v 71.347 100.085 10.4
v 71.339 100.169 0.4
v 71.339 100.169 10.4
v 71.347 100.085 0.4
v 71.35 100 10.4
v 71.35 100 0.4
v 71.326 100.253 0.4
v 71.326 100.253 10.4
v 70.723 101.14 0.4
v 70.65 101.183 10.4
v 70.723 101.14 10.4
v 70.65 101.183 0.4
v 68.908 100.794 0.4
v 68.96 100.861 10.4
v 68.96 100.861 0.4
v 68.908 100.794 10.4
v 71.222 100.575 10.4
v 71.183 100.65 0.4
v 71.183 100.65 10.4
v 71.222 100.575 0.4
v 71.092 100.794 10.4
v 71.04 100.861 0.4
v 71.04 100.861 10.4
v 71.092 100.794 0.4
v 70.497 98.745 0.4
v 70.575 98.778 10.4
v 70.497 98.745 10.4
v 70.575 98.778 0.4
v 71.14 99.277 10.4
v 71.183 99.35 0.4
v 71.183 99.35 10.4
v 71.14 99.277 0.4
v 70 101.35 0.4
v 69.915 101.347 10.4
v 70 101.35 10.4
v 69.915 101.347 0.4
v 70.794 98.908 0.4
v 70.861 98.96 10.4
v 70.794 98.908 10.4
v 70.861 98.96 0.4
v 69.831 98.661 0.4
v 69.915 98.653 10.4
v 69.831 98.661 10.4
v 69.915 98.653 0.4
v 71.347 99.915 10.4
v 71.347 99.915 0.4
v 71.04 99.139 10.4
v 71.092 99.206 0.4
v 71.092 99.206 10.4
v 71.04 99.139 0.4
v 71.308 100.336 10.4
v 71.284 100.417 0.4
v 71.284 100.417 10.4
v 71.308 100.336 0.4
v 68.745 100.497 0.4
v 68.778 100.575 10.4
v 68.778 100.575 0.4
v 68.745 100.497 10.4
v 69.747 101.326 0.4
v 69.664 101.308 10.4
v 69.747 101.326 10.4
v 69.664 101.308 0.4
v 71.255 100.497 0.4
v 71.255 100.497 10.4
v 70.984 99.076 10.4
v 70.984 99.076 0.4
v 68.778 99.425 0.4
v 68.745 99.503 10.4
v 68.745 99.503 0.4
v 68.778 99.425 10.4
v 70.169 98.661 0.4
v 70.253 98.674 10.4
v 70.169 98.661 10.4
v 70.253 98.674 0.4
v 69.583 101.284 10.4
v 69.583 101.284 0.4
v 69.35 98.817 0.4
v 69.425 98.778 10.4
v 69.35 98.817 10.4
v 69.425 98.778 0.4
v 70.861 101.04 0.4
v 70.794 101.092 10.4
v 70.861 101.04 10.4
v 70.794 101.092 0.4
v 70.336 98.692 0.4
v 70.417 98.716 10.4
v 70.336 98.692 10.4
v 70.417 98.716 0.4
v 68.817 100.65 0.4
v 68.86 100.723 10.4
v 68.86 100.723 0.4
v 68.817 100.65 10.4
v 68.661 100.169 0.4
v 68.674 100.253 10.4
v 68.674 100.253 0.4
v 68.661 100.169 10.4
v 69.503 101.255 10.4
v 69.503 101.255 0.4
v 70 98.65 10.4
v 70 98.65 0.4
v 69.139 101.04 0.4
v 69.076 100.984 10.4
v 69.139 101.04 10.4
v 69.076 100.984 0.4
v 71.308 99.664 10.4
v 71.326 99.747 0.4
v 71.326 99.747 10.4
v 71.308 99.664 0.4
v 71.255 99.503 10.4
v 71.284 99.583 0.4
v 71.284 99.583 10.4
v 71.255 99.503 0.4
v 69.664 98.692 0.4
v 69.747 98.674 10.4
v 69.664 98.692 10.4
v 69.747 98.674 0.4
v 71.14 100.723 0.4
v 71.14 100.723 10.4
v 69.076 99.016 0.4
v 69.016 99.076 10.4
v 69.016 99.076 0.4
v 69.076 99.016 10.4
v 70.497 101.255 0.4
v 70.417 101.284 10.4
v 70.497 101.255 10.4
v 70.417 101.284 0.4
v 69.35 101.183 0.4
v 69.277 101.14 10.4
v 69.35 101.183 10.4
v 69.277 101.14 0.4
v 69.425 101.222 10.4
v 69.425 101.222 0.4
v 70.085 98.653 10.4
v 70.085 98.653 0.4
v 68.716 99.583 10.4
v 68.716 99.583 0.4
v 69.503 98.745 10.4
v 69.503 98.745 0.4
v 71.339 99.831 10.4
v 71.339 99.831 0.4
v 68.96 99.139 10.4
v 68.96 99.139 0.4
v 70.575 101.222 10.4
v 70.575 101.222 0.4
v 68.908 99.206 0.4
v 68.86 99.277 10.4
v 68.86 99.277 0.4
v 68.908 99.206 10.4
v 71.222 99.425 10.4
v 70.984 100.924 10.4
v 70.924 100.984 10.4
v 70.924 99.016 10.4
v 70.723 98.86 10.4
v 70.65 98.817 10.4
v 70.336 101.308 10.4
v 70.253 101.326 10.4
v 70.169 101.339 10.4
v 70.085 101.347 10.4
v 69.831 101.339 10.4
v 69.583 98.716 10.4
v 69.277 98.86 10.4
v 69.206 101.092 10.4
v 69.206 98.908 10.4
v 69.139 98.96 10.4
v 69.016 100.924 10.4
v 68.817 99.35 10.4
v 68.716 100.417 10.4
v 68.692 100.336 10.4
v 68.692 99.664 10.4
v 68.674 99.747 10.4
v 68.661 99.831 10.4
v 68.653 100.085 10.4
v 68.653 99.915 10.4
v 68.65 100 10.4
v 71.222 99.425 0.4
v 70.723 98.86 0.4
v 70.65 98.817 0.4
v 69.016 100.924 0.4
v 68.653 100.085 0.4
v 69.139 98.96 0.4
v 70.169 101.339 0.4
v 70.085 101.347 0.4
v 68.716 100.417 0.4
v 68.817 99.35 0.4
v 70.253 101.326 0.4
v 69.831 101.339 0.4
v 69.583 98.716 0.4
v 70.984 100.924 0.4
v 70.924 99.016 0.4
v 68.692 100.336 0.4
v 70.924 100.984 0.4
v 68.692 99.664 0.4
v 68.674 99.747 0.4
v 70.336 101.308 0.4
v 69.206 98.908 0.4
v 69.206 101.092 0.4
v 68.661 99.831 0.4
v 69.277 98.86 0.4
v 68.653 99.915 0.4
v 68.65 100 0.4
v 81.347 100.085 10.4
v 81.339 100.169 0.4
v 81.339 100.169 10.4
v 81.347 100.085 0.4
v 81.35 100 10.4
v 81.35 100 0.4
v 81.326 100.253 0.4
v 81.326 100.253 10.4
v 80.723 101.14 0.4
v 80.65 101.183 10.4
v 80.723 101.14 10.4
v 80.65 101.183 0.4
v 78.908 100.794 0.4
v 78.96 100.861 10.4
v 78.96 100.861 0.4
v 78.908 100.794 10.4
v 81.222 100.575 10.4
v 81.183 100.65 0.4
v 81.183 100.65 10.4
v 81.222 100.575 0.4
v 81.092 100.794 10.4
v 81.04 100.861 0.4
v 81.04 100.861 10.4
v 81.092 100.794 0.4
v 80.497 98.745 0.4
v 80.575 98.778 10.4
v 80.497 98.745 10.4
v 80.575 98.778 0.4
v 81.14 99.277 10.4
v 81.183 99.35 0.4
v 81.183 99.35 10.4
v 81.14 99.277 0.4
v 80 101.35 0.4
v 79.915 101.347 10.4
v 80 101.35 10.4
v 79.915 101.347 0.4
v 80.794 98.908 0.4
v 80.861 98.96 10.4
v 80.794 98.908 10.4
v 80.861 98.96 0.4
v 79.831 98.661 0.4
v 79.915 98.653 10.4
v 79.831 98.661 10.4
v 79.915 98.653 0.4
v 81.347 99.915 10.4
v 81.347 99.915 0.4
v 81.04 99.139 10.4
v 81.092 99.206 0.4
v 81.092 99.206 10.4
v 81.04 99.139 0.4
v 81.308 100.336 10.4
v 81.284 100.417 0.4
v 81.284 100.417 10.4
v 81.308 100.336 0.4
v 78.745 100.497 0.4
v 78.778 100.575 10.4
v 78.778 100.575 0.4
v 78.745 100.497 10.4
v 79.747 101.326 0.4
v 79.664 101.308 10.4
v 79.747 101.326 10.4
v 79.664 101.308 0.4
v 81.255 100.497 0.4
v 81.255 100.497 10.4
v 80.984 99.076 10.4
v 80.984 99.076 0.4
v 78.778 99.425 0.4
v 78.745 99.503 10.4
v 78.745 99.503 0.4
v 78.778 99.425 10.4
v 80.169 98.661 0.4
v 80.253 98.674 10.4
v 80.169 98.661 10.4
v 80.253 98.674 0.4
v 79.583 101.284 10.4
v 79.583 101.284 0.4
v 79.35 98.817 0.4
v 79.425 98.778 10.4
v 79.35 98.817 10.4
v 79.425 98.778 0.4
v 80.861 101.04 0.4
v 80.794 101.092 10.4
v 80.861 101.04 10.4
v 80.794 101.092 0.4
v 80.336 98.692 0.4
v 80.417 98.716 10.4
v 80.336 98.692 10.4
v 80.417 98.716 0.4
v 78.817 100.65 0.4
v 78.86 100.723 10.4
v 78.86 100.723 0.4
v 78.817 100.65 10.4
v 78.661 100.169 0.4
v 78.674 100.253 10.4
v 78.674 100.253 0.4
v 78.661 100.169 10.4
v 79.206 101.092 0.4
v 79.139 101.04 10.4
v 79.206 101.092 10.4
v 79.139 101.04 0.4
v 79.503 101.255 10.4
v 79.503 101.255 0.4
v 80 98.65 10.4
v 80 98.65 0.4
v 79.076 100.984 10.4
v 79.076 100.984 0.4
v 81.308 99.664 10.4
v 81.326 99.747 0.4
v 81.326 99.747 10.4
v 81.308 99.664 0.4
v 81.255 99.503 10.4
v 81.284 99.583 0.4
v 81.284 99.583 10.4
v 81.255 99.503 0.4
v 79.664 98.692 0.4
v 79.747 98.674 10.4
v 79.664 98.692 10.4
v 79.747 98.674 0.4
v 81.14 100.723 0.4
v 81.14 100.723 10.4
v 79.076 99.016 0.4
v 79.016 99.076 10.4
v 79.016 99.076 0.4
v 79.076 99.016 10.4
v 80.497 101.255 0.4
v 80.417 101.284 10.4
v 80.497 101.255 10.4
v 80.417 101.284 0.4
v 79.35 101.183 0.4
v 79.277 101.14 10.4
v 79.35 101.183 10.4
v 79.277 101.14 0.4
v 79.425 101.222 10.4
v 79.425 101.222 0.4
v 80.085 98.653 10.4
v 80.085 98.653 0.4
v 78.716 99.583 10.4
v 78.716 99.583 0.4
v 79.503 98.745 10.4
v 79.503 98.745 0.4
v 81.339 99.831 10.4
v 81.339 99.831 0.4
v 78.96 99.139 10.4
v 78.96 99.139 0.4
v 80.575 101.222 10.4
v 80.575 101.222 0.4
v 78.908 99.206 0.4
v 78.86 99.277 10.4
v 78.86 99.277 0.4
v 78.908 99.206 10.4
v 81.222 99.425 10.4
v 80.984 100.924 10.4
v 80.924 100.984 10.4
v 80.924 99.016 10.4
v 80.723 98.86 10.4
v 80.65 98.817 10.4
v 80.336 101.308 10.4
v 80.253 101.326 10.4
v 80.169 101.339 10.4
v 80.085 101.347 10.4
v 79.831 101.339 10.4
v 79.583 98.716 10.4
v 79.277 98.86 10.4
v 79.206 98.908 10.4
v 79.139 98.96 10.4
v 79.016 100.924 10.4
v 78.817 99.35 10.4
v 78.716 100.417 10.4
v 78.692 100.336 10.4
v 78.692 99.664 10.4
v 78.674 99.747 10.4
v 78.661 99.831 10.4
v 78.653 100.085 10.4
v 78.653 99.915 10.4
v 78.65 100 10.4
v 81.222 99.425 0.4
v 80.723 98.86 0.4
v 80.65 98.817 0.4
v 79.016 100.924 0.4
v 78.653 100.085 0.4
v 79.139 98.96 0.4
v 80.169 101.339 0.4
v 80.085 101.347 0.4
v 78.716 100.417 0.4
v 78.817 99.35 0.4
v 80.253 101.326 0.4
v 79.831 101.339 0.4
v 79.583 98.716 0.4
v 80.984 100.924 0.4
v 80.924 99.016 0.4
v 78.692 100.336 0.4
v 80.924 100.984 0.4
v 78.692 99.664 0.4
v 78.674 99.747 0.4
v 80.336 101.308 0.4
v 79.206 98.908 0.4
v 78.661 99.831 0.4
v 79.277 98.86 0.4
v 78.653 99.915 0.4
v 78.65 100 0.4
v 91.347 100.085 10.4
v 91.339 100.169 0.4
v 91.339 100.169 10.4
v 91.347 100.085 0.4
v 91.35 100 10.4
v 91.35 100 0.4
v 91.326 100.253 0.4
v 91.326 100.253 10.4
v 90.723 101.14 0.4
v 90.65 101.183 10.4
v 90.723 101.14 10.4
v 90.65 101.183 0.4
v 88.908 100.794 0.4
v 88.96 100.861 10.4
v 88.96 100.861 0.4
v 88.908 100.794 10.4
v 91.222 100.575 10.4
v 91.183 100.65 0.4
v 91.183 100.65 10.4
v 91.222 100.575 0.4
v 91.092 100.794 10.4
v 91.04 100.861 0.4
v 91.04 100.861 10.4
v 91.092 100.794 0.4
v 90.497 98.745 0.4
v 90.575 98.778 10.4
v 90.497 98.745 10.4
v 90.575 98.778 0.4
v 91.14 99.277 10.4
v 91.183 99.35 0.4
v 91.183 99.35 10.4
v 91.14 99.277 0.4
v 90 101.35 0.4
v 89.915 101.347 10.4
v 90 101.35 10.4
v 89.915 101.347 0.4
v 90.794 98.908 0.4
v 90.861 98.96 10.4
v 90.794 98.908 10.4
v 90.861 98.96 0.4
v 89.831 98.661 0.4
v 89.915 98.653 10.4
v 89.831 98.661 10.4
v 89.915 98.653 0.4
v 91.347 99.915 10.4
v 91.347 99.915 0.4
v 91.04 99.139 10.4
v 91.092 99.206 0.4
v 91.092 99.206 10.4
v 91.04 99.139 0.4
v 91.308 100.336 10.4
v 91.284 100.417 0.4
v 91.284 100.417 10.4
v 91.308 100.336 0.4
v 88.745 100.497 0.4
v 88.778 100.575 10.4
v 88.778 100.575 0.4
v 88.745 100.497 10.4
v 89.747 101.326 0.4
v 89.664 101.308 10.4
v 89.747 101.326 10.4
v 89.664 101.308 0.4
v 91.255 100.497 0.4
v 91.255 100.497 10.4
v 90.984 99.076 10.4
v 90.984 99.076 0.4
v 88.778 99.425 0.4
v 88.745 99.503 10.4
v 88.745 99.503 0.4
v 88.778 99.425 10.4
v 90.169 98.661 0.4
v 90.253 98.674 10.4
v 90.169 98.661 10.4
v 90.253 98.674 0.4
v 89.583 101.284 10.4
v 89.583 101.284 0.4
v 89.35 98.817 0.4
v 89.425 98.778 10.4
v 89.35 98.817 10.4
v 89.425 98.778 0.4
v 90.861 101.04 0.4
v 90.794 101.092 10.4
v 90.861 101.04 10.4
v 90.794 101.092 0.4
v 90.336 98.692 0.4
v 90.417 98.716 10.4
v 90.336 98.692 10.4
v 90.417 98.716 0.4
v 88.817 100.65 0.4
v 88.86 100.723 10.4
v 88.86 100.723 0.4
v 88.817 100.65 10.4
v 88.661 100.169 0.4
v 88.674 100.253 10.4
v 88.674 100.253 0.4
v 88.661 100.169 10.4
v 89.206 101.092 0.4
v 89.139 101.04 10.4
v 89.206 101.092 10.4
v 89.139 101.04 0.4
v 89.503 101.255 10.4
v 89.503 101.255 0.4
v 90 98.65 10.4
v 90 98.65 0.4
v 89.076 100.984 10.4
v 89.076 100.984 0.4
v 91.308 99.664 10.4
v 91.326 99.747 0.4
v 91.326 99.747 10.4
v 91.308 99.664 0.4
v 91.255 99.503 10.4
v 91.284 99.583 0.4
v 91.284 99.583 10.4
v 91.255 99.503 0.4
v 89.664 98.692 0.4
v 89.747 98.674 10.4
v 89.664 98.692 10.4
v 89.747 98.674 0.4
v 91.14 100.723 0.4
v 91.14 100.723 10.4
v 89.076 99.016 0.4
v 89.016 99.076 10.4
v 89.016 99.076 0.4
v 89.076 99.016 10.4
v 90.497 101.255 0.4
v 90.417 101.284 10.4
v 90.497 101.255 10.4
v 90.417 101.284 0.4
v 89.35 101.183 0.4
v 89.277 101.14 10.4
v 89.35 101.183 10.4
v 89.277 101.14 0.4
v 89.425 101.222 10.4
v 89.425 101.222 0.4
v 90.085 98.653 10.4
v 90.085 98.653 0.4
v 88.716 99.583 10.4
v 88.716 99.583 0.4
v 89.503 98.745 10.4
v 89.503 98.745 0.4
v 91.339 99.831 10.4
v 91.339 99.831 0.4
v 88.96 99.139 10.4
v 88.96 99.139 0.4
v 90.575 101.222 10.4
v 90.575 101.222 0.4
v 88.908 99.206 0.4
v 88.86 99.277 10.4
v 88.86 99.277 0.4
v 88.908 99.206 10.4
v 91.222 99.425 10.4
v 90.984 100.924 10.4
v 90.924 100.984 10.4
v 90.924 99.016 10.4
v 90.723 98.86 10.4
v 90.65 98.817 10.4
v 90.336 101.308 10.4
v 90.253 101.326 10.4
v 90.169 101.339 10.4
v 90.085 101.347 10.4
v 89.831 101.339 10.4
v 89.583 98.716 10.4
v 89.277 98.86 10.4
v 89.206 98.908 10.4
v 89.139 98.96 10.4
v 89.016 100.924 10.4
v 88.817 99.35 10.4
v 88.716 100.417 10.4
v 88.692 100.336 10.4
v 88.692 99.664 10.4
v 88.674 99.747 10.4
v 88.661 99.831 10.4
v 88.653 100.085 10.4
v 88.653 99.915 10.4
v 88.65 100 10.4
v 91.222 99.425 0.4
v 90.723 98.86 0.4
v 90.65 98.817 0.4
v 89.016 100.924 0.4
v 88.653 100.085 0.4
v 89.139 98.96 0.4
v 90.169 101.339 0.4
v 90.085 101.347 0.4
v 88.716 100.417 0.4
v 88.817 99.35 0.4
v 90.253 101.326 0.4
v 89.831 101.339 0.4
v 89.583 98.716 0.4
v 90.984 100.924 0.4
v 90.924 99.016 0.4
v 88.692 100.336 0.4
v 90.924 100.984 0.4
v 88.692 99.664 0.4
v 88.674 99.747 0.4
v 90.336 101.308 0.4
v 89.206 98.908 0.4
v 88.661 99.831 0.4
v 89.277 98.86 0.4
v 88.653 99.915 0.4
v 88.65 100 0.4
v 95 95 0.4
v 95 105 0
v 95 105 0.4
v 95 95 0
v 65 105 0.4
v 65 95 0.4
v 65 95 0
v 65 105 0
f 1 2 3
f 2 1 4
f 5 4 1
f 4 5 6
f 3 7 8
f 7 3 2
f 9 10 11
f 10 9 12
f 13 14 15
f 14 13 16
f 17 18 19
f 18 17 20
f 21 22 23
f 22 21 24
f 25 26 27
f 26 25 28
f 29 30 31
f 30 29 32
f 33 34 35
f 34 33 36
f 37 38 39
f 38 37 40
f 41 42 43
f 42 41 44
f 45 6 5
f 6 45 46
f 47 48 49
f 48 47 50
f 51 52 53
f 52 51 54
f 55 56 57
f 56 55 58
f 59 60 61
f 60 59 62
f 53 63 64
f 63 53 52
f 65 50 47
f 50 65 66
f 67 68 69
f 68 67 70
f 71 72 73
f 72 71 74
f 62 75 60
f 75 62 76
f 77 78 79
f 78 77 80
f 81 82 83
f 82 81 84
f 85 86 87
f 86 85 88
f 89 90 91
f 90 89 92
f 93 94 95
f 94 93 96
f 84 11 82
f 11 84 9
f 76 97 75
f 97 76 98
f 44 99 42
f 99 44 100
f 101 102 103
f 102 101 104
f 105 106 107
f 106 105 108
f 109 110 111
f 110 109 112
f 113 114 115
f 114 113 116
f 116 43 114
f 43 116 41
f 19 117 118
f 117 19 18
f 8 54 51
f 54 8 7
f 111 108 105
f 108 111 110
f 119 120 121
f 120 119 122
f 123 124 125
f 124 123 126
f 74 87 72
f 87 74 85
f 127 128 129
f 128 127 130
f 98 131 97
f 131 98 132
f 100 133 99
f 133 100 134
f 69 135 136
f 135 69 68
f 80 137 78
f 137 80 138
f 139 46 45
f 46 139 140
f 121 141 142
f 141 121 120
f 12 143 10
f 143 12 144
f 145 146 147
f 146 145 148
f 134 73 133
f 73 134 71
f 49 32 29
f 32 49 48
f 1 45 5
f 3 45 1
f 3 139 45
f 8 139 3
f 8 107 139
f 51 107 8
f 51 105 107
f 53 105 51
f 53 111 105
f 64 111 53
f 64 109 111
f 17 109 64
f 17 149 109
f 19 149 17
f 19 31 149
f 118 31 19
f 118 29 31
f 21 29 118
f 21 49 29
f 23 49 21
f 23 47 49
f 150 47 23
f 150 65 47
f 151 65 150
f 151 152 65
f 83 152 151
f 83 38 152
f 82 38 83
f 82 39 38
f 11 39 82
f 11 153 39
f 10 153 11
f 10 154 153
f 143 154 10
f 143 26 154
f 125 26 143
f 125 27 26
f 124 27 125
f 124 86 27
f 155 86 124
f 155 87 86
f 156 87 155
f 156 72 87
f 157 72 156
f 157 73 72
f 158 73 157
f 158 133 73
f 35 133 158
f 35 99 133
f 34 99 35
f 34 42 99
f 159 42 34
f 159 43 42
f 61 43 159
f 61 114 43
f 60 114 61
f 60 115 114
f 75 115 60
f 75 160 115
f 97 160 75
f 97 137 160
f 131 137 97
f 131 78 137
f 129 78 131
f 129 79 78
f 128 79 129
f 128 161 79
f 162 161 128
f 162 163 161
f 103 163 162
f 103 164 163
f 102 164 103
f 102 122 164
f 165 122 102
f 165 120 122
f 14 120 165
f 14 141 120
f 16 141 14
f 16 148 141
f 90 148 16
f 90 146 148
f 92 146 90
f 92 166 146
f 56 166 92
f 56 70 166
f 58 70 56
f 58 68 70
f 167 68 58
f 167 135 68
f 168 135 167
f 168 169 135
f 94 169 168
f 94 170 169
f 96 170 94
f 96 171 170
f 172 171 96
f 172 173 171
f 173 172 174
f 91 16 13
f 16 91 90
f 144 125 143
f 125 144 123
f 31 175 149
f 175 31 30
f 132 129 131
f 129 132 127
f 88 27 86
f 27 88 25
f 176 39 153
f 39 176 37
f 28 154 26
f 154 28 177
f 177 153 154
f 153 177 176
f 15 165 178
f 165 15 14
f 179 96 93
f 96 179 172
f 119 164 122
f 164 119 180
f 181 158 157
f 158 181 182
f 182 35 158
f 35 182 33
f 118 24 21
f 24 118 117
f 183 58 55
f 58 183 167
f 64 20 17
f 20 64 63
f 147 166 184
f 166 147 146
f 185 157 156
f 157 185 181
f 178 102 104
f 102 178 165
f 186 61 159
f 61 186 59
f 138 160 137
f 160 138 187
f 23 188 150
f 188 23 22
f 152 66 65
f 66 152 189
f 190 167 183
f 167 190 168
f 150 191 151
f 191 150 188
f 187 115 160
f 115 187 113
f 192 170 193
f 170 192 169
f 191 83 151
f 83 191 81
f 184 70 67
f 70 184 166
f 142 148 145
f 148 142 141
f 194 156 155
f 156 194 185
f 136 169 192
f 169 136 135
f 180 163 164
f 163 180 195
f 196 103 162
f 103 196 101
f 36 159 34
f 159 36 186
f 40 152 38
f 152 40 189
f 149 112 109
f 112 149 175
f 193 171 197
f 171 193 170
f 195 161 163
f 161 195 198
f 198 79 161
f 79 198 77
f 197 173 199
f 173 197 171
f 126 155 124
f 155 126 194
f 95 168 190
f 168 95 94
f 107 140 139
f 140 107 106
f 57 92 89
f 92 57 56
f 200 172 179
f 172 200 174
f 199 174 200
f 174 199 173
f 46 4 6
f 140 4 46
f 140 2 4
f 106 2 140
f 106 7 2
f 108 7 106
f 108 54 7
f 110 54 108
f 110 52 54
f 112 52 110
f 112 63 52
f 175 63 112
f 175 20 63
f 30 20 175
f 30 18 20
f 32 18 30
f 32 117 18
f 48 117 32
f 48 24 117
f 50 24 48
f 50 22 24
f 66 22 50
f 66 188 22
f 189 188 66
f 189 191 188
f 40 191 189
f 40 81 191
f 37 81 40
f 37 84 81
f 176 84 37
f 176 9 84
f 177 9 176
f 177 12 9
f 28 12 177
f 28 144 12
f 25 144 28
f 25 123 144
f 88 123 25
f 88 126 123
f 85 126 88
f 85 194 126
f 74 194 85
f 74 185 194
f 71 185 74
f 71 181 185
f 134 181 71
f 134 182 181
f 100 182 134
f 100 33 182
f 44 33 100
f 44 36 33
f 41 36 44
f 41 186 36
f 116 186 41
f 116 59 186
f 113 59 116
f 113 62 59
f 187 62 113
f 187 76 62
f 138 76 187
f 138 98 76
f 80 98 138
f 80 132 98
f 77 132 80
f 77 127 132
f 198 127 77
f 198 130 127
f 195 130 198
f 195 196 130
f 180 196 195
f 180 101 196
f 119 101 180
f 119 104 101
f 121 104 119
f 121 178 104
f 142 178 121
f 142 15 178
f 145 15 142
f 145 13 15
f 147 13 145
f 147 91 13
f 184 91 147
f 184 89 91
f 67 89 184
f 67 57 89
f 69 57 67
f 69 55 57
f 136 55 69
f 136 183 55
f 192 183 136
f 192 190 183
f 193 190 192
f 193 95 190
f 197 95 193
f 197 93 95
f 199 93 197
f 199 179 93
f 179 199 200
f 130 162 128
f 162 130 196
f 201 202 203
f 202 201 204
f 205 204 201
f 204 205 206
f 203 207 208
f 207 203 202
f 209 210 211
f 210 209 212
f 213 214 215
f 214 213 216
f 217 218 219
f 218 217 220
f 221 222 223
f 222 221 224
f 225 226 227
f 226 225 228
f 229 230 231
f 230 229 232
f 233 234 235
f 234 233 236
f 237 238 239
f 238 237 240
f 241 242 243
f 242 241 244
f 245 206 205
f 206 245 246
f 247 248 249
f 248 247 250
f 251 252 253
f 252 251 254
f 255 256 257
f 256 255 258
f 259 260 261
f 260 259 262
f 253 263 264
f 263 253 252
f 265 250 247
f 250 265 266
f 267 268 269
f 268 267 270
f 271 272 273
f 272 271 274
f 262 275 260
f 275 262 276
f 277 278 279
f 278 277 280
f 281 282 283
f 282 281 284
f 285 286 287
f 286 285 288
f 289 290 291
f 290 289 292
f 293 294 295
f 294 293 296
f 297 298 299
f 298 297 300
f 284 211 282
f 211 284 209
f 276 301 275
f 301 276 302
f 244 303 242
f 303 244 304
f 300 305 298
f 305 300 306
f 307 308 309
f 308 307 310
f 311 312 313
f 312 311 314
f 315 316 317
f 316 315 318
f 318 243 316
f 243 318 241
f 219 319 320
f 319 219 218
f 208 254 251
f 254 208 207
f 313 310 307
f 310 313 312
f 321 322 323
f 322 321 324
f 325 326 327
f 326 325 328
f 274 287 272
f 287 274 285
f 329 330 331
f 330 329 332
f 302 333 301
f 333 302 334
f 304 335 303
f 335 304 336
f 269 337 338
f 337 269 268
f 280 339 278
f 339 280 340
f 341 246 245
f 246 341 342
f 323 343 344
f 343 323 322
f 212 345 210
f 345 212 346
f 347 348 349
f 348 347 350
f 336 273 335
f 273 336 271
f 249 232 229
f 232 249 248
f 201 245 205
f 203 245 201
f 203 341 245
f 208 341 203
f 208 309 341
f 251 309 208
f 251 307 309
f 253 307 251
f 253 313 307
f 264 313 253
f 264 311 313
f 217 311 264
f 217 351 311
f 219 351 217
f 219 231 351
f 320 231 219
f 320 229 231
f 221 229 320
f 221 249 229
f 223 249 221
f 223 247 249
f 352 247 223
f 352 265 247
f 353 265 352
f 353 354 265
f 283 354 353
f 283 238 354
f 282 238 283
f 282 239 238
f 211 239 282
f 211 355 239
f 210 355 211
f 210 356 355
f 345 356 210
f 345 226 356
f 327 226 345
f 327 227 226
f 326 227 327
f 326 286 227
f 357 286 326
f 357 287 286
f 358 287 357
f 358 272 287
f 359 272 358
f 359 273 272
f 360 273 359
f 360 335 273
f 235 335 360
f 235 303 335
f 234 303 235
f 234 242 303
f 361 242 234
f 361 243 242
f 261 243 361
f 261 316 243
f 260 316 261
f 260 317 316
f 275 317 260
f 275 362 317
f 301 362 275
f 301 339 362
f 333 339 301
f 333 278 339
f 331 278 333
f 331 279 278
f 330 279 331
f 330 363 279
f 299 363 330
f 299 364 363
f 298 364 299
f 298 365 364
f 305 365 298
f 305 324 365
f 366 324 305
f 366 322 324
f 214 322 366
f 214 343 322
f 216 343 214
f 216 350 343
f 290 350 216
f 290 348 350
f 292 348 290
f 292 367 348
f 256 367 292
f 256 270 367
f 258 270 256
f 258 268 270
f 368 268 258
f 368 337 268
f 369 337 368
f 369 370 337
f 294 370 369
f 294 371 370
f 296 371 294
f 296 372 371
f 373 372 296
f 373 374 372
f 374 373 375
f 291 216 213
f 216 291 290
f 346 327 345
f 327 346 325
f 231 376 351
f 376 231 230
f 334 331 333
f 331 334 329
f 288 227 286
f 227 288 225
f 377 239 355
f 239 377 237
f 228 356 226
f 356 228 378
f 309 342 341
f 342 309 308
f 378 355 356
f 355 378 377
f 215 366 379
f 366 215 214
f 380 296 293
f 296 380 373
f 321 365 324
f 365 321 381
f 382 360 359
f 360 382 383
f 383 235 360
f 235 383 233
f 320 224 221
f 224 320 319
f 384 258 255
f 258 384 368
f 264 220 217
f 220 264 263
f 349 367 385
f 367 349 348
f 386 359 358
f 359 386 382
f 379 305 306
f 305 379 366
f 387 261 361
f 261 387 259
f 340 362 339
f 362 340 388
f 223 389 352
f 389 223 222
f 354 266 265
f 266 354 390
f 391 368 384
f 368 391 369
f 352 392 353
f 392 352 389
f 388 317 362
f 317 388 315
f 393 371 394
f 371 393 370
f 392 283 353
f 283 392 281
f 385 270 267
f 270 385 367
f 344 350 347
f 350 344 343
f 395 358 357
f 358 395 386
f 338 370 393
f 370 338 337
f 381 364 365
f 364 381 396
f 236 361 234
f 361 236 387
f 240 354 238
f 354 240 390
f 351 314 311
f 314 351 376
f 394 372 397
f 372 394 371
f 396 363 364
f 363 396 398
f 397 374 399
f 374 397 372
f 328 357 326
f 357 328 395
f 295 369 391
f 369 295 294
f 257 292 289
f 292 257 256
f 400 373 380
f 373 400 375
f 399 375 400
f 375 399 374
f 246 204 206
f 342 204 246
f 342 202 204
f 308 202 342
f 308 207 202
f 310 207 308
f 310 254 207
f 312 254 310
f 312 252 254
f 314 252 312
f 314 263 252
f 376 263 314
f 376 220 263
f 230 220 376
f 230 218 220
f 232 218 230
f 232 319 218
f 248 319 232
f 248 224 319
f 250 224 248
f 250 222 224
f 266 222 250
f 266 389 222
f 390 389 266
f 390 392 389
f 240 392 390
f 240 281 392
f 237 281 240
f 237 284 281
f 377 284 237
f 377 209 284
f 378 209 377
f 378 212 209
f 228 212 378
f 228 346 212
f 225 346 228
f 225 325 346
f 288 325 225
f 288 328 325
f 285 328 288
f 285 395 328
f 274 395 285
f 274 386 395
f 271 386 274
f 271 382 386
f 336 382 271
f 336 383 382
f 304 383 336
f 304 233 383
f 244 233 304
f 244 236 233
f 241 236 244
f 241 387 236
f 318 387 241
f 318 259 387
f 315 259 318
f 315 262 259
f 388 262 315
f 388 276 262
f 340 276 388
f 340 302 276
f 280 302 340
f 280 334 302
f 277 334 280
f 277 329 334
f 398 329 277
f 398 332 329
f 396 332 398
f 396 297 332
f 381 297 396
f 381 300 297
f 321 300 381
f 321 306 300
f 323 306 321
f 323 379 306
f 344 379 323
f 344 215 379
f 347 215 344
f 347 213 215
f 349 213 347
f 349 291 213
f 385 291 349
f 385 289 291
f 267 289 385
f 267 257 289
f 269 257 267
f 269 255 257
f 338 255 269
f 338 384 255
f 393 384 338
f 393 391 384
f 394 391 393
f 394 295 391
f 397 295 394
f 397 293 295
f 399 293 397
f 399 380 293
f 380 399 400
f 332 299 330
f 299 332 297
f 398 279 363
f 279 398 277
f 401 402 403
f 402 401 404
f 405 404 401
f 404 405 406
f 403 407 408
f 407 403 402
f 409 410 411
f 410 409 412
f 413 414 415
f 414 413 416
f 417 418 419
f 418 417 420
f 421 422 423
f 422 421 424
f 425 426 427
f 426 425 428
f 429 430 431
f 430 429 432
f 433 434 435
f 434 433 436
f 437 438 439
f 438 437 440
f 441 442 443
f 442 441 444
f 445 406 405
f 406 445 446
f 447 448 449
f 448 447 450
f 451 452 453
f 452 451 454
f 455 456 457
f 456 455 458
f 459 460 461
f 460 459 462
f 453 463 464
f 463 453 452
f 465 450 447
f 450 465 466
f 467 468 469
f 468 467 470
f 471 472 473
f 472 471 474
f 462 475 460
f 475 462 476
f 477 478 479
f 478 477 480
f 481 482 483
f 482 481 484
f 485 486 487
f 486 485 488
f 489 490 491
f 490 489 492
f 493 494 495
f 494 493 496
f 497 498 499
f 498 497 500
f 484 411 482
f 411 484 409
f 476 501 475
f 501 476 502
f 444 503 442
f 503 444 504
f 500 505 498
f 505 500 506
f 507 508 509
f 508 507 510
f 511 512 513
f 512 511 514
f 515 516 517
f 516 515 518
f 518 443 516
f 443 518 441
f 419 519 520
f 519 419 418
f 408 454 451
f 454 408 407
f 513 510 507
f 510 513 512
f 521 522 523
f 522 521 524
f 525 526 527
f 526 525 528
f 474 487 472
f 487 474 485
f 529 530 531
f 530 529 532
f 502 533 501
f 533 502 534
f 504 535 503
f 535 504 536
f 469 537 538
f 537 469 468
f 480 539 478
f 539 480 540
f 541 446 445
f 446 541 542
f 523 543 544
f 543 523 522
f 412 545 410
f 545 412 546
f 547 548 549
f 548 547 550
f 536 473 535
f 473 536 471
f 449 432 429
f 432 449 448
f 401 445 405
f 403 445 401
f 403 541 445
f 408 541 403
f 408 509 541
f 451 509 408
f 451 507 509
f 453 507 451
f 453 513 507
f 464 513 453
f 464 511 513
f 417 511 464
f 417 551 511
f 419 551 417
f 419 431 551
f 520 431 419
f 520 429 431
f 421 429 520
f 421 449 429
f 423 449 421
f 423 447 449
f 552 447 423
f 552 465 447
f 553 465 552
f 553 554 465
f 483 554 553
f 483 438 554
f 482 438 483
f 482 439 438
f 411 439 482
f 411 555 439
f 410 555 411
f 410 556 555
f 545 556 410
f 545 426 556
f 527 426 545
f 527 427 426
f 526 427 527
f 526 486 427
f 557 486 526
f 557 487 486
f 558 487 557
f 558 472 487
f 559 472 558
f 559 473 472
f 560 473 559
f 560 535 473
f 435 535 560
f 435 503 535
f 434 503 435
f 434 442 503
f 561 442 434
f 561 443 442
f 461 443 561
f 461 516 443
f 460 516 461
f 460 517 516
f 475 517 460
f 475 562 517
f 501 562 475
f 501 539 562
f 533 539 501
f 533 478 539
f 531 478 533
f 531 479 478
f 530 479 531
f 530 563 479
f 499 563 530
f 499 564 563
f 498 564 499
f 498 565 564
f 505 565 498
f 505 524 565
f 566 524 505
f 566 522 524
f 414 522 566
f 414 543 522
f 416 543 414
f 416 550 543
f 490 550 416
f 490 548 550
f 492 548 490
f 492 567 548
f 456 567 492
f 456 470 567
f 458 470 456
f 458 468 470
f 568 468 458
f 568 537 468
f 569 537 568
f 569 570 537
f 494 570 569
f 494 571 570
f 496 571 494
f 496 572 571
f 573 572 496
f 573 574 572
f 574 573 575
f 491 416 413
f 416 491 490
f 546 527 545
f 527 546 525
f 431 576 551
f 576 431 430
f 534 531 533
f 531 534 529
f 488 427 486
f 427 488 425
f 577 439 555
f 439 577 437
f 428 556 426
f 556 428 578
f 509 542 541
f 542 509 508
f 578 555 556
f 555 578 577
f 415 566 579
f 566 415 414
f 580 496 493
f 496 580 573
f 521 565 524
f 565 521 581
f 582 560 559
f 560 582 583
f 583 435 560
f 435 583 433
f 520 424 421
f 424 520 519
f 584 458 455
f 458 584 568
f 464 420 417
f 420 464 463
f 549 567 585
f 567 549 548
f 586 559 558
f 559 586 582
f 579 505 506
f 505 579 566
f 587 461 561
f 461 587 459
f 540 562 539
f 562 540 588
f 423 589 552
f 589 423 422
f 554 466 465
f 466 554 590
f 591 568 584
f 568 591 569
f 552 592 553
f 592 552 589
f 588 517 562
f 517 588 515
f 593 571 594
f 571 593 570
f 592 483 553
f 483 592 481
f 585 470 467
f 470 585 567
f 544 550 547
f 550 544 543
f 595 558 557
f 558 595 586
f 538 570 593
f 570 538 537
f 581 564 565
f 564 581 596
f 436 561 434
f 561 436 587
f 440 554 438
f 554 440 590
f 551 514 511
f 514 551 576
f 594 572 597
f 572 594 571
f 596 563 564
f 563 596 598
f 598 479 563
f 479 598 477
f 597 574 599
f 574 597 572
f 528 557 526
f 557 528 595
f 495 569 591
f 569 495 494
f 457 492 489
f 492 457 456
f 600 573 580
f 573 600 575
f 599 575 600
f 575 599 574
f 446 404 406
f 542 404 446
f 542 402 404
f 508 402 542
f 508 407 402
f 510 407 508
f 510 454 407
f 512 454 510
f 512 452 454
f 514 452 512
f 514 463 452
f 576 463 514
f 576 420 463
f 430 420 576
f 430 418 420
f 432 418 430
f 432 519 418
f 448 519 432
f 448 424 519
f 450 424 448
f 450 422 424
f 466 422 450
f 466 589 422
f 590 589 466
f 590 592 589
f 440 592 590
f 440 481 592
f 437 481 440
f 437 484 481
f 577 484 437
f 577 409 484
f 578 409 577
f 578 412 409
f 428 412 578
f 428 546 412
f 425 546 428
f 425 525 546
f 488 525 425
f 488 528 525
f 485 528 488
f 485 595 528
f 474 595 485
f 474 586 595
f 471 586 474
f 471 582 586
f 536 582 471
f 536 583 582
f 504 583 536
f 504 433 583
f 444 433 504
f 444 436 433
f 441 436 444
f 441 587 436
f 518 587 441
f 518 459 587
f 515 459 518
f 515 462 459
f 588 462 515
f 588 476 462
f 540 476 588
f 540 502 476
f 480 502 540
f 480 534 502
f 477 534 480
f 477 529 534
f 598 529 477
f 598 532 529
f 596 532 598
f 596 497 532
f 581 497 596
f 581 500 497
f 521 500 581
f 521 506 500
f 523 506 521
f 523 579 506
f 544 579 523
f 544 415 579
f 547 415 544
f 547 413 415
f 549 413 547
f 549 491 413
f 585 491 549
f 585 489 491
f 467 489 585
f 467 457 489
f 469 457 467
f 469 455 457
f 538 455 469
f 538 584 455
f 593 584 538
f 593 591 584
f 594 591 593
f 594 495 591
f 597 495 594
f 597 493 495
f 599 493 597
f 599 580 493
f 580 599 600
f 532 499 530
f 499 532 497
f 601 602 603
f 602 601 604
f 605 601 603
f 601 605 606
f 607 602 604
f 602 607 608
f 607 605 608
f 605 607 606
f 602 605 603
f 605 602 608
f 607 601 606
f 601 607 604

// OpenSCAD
width = 100;
height = 155;
base_thickness = 2;

edge_thickness = 6;
edge_height = 10;

inlay = 17;

show_plugs = false;
show_triangle = false;

// variables above this point appear in the customizer
module null() {}

h = base_thickness;
padding = 3;

hd = 2; // first half was 1.5mm, which is a bit small for a pencil

if (show_triangle) {
    color("red") {
        difference() {
        
            // triangle base
            linear_extrude(height=h) difference() {
                // main base
                resize([width,height]) polygon(points=[[0,0],[1,0],[0,1]]);
              
                // subtract instep to reduce print time
                offset(r=padding, $fn=360) // then increase by padding to get rounded internal corners
                    offset(r=-inlay-padding) // overreduce by the inset amount and padding
                        resize([width,height]) polygon(points=[[0,0],[1,0],[0,1]]);
                
                // alignment window
                // aw = width-inlay*2;
                aw = width/4;
                translate([inlay,0,0]) square([aw, 2]);
                

                // 1cm marking holes
                for (y=[10:10:140]) {
                    translate([4,y,0]) circle(d=hd,$fn=20);
                }

                // 5mm marking holes
                for (y=[10:10:130]) {
                    translate([7,y-5,0]) circle(d=hd,$fn=20);
                }
                
                // 2.5mm marking holes
    //            for (y=[10:10:130]) {
    //                translate([10,y-2.5,0]) circle(d=2,$fn=20);
    //                translate([10,y-7.5,0]) circle(d=2,$fn=20);
    //            }
                
                // 1mm marking holes
    //            translate([4,0,0]) 
    //            for (y=[10:10:130]) {
    //                translate([3,y-1,0]) circle(d=hd,$fn=20);
    //                translate([6,y-2,0]) circle(d=hd,$fn=20);
    //                translate([9,y-3,0]) circle(d=hd,$fn=20);
    //                translate([3,y-4,0]) circle(d=hd,$fn=20);
    //                translate([6,y-5,0]) circle(d=hd,$fn=20);
    //                translate([9,y-6,0]) circle(d=hd,$fn=20);
    //                translate([3,y-7,0]) circle(d=hd,$fn=20);
    //                translate([6,y-8,0]) circle(d=hd,$fn=20);
    //                translate([9,y-9,0]) circle(d=hd,$fn=20);
    //            }
            }
            
            translate([inlay+3,100,-5]) cylinder(d=4,h=h+10,$fn=100);
            
            translate([inlay+3,100, h-1]) cylinder(d=6,h=h+10,$fn=100);
        }

        // cm markers
        for (y=[10:10:150]) {
            translate([0.5,y,h]) 
                linear_extrude(height=0.2) square([1,0.2], true);
        }

    }


    //color("yellow") translate([inlay+3,100,0]) cylinder(d=6,h=10,$fn=100);

    // straight edge WITH rectangle alignment tabs
    //color("red") {
    //    linear_extrude(height=h+edge_height)
    //        translate([0,-edge_thickness,0])
    //            difference() {
    //                square([width,edge_thickness]);
    //                translate([width/4*3,edge_thickness/2,0]) square([15,1], true);
    //                translate([width/4,edge_thickness/2,0]) square([15,1], true);
    //            }
    //}    

    // straight edge WITH cylindrical alignment
    color("red") {
        translate([0,-edge_thickness,0]) {
            difference() {
                linear_extrude(height=h+edge_height)
                    square([width,edge_thickness]);
                
                d = edge_thickness-3;
                translate([10,edge_thickness/2,-1]) cylinder(d=d,h=edge_height/2+1,$fn=100);
                translate([width/2,edge_thickness/2,-1]) cylinder(d=d,h=edge_height/2+1,$fn=100);
                translate([width-10,edge_thickness/2,-1]) cylinder(d=d,h=edge_height/2+1,$fn=100);
            }
            
    //        translate([width/4,edge_thickness/2,-1]) cylinder(d=edge_thickness-2,h=edge_height/2+1,$fn=100);
    //        translate([width/4*2,edge_thickness/2,-1]) cylinder(d=edge_thickness-2,h=edge_height/2+1,$fn=100);
    //        translate([width/4*3,edge_thickness/2,-1]) cylinder(d=edge_thickness-2,h=edge_height/2+1,$fn=100);

        }    
    }
}


// joining plugs

if(show_plugs) {
    // plug one (simple)
    color("red")  translate([30,30,0]) {
        
        translate([10,0,0]) {
            union() {
                cylinder(d=6,h=1,$fn=100);
                cylinder(d=4,h=h*2,$fn=100);
            }
        }

        // plug two (two part interlocking)
        difference() {
            union() {
                cylinder(d=6,h=1,$fn=100);
                cylinder(d=4,h=h*2-1,$fn=100);
            }
            translate([0,0,-1]) cylinder(d=1,h=h*2+2,$fn=100);
        }

        translate([0,10,0]) {
            union() {
                cylinder(d=6,h=1,$fn=100);
                cylinder(d=1,h=h,$fn=100);
            }
        }
    }

}
if (true) {

d = 2.7; // (edge_thickness-3)*0.95;
echo(d);


translate([65,95,0]) cube([30,10,0.4]);
translate([0,0,0.4]) color("red") {
    translate([70,100,0]) cylinder(d=d,h=edge_height,$fn=100);
    translate([80,100,0]) cylinder(d=d,h=edge_height,$fn=100);
    translate([90,100,0]) cylinder(d=d,h=edge_height,$fn=100);
}


}

//color("red")
//    offset(r=inset_padding, $fn=360) // then increase by padding to get rounded internal corners
//        offset(r=-inset-inset_padding) // overreduce by the inset amount and padding
//            resize([x,y]) polygon(points=[[0,0],[1,0],[0,1]]);

//color("blue")
//    offset(delta=-inset, chamfer=true)
//        resize([x,y]) polygon(points=[[0,0],[1,0],[0,1]]);
